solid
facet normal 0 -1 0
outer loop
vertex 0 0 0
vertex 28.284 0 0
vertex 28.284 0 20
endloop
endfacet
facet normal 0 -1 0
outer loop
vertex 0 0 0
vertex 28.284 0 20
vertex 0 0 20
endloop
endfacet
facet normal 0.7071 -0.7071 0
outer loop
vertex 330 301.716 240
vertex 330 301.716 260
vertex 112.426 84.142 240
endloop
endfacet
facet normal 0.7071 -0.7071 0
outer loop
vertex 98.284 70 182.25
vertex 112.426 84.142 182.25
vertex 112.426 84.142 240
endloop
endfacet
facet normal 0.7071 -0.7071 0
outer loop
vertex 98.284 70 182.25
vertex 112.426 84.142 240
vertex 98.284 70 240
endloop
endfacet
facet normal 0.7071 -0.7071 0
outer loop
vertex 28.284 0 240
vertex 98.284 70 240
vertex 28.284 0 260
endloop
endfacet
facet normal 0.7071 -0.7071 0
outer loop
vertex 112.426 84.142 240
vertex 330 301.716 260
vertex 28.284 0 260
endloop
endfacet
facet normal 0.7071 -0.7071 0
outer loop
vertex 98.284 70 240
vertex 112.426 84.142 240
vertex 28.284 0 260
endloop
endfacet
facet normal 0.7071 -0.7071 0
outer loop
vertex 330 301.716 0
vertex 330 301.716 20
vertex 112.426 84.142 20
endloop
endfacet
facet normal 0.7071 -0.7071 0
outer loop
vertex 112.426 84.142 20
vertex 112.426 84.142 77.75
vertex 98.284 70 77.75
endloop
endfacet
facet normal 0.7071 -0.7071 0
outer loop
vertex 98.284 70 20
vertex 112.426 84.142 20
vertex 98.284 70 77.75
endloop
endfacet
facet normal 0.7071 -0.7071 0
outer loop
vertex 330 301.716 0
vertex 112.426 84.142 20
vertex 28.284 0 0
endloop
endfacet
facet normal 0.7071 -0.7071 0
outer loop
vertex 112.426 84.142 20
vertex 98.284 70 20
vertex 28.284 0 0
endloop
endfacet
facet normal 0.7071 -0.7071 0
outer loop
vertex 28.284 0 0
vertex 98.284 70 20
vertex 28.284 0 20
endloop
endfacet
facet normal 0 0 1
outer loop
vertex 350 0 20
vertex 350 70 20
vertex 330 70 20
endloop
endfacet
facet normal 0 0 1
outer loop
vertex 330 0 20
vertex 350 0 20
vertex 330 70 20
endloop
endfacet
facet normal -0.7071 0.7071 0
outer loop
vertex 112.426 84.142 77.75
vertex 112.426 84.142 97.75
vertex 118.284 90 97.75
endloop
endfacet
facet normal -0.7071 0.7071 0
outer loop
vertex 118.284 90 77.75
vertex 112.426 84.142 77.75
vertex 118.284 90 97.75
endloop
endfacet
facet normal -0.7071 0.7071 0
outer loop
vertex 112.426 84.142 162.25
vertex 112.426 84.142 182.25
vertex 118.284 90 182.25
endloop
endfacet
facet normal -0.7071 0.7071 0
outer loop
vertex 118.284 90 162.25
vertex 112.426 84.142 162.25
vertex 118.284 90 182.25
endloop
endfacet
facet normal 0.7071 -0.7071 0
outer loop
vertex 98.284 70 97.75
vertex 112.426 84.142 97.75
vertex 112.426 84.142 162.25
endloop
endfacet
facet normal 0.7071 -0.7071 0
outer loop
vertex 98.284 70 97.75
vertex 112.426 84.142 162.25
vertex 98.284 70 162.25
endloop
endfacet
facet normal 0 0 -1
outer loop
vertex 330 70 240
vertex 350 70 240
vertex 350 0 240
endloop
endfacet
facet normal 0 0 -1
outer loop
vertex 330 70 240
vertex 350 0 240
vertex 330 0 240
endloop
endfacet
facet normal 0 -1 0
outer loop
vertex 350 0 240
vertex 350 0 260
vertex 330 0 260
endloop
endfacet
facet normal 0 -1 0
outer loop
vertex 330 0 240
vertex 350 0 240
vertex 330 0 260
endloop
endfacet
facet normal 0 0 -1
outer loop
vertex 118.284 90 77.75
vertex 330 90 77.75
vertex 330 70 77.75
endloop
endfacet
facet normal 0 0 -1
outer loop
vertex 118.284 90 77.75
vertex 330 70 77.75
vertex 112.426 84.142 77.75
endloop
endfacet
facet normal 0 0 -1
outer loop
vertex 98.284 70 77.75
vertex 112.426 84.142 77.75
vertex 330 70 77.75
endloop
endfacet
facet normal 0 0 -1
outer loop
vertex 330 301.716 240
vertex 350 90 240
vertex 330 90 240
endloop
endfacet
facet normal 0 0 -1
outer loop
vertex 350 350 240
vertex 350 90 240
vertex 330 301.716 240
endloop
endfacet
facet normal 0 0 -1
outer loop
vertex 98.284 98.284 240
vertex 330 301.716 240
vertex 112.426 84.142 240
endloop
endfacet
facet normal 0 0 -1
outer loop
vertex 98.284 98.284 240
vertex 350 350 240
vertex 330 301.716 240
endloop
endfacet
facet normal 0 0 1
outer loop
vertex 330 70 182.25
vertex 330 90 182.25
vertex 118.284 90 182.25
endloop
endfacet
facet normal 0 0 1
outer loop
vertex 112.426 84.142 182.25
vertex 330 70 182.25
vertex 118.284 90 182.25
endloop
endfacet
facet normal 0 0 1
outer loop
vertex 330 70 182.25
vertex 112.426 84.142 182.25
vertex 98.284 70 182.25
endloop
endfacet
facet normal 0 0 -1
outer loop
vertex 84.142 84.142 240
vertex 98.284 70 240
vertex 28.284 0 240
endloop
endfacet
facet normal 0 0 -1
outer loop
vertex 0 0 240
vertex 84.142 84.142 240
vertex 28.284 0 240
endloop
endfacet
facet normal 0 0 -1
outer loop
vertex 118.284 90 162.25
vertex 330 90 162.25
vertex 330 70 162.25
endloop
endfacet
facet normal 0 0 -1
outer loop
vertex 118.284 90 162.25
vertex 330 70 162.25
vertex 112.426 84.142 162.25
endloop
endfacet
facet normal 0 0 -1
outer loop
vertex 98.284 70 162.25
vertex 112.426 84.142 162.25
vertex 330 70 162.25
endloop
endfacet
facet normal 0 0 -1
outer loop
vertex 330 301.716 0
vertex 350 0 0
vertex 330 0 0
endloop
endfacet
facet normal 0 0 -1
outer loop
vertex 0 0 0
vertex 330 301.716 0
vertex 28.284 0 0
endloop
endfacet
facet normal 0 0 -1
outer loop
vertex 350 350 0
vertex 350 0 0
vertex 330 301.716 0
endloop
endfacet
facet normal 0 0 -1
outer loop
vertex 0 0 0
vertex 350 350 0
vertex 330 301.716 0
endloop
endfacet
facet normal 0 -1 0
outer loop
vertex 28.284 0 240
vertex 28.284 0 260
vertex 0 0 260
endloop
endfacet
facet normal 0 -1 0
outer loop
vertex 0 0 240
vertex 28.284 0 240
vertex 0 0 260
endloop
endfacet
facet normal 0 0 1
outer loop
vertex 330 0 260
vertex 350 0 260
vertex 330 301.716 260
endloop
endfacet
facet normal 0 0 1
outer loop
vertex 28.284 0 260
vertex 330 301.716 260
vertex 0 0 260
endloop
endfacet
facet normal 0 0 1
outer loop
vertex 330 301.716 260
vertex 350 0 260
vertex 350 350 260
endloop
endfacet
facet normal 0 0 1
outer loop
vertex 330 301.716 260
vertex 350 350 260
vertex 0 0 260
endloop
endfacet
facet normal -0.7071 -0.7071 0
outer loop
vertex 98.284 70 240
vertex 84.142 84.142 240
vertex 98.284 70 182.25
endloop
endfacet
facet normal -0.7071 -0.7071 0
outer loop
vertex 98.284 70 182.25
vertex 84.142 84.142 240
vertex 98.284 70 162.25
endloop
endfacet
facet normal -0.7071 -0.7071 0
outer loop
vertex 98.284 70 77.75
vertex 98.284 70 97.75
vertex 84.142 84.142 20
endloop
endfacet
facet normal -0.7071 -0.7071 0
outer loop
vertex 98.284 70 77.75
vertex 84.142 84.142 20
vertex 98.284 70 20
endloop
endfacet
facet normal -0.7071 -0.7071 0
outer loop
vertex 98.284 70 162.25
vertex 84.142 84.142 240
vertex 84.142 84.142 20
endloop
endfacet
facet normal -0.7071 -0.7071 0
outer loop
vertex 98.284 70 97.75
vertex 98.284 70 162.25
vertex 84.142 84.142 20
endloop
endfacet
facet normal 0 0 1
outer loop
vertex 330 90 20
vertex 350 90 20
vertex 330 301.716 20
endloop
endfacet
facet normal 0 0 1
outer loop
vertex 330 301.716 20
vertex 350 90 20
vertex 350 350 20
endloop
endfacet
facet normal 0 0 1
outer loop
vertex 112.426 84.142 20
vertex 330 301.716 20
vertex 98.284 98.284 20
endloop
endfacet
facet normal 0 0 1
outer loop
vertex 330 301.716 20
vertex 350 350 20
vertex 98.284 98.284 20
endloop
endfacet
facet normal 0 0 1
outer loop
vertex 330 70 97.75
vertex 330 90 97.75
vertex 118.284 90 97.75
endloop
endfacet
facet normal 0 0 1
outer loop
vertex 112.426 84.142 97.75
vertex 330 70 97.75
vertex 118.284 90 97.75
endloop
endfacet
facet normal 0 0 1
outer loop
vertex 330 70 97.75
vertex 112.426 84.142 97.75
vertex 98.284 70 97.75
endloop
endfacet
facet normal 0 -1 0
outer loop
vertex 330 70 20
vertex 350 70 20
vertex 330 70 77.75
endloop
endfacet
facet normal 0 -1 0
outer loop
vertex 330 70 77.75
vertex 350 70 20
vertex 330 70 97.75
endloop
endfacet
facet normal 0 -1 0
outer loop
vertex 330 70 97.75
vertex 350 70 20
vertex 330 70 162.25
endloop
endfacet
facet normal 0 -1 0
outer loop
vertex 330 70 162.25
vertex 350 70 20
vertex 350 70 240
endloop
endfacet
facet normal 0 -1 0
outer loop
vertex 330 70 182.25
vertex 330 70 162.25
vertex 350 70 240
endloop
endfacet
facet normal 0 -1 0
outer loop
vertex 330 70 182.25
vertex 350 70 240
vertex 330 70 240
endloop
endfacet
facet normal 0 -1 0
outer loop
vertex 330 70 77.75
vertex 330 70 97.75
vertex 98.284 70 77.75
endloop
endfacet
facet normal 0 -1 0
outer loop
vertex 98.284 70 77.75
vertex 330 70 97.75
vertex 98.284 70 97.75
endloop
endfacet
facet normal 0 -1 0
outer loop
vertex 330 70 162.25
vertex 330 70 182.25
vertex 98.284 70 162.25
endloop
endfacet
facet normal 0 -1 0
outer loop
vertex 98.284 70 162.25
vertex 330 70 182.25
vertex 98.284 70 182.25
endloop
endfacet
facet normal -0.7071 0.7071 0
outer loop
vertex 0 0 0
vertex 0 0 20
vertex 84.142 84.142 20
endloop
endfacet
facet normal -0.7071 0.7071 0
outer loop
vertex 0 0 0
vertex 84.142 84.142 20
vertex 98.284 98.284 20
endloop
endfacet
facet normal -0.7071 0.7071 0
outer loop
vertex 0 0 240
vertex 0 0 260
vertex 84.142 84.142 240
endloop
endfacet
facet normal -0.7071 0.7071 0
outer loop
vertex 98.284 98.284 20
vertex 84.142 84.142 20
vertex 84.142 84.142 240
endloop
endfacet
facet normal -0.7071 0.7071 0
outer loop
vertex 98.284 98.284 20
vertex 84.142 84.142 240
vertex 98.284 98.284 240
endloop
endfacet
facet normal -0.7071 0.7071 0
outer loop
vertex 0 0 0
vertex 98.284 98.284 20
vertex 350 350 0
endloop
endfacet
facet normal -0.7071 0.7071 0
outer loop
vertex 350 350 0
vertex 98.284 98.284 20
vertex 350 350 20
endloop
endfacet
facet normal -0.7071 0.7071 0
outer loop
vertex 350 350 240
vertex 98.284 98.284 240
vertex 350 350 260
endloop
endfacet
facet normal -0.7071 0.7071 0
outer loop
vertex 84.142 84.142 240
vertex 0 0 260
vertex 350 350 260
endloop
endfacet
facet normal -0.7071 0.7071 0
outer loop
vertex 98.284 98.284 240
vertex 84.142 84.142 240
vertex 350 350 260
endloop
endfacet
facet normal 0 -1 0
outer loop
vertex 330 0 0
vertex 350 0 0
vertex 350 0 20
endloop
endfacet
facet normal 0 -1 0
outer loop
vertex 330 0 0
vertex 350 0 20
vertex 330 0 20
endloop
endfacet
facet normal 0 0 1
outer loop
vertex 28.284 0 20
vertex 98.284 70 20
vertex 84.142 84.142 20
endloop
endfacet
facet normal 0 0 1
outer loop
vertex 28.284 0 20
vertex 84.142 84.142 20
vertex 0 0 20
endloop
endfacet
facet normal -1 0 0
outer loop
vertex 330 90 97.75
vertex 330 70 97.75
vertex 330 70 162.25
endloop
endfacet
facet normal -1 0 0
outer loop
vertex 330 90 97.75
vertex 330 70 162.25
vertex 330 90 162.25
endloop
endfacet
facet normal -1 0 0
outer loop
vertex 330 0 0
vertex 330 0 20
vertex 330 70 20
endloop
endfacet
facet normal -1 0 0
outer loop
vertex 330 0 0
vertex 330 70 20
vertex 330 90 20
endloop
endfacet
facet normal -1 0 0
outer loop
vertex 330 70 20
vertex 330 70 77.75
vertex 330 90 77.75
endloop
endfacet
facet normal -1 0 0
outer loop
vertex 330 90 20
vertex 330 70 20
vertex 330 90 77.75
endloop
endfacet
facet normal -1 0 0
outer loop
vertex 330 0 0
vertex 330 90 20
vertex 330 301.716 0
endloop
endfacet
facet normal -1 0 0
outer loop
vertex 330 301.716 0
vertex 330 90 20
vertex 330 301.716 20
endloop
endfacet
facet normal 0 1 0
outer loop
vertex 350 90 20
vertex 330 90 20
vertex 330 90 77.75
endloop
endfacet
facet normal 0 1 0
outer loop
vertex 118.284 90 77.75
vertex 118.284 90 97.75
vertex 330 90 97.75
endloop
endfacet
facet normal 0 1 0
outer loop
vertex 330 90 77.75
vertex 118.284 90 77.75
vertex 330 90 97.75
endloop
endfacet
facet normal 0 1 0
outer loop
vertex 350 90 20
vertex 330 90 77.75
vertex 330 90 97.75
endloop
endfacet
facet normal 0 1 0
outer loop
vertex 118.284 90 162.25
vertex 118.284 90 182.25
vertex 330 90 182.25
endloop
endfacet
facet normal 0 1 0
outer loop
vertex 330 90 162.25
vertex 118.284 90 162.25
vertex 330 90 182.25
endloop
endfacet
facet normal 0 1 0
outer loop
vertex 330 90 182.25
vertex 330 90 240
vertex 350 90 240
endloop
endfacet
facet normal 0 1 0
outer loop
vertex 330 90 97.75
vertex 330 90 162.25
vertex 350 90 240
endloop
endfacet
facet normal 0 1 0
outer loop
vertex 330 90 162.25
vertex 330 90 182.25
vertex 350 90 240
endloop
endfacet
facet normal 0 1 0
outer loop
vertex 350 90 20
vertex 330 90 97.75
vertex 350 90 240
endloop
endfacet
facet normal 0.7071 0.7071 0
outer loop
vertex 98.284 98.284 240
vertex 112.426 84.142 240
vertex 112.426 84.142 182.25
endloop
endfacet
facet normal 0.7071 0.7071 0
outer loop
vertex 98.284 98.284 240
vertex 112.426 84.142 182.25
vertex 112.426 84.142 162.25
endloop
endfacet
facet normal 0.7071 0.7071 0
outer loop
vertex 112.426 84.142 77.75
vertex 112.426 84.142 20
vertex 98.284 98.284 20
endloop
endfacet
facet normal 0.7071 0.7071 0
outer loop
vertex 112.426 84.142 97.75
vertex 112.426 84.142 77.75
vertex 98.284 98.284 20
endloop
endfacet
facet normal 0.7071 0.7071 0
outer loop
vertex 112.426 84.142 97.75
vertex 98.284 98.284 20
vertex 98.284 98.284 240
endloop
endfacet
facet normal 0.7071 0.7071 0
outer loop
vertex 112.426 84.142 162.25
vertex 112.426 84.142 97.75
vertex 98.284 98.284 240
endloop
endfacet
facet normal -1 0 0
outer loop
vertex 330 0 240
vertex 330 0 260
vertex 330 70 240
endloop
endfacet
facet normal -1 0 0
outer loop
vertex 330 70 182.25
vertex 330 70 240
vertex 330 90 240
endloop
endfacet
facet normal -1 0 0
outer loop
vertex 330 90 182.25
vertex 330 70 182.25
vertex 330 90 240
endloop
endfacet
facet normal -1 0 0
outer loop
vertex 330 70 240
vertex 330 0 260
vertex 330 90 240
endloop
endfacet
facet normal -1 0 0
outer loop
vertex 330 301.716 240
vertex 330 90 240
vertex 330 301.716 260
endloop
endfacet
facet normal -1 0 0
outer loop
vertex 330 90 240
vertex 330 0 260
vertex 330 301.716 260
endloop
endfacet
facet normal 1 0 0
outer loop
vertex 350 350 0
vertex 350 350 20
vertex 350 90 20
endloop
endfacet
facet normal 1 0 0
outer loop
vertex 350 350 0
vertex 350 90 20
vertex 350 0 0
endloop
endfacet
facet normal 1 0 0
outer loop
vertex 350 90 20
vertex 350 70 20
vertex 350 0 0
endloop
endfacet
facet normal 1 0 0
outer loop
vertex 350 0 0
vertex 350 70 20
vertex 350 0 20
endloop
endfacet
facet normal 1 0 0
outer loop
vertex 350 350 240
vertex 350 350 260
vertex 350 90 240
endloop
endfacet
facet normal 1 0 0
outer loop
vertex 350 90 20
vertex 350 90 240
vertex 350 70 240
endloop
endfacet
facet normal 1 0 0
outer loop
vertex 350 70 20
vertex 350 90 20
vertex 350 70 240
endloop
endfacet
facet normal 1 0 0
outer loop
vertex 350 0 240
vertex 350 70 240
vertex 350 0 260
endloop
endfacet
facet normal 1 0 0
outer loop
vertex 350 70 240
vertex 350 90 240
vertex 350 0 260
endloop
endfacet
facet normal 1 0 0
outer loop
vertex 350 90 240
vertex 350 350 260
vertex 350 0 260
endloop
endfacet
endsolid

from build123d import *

# Parameters (mm, degrees)
BOSS_EXTRUDE1_DEPTH = 20
SKETCH2_W           = 20
SKETCH2_H           = 20
BOSS_EXTRUDE2_DEPTH = 220
BOSS_EXTRUDE3_DEPTH = 20
LPATTERN1_COUNT     = 2
LPATTERN1_PITCH     = 84.5


with BuildPart() as part:
    # Sketch1 → Boss-Extrude1 (new body)
    with BuildSketch(Plane.XY):
        Polygon((0, 0), (350, 350), (350, 0), (330, 0), (330, 301.715728753), (28.284271247, 0), align=None)
    boss_extrude1 = extrude(amount=BOSS_EXTRUDE1_DEPTH)

    # Sketch2 → Boss-Extrude2 (add)
    with BuildSketch(Plane.XY.offset(20)):
        with Locations((340, 80)):
            Rectangle(SKETCH2_W, SKETCH2_H)
        Polygon((98.284271247, 70), (112.426406871, 84.142135624), (98.284271247, 98.284271247), (84.142135624, 84.142135624), align=None)
    extrude(amount=BOSS_EXTRUDE2_DEPTH)

    # Mirror1: Boss-Extrude1 across plane
    add(boss_extrude1.mirror(Plane(origin=(0, 0, 130), x_dir=(1, 0, 0), z_dir=(0, 0, -1))))

    # Sketch5 → Boss-Extrude3 (add)
    with BuildSketch(Plane.XY.offset(182.25)):
        Polygon((330, 70), (98.284271247, 70), (118.284271247, 90), (330, 90), align=None)
    boss_extrude3 = extrude(amount=-BOSS_EXTRUDE3_DEPTH)

    # LPattern1: Boss-Extrude3 ×2
    with Locations(*[(0, 0, -i * LPATTERN1_PITCH) for i in range(1, LPATTERN1_COUNT)]):
        add(boss_extrude3)


solid = part.part
